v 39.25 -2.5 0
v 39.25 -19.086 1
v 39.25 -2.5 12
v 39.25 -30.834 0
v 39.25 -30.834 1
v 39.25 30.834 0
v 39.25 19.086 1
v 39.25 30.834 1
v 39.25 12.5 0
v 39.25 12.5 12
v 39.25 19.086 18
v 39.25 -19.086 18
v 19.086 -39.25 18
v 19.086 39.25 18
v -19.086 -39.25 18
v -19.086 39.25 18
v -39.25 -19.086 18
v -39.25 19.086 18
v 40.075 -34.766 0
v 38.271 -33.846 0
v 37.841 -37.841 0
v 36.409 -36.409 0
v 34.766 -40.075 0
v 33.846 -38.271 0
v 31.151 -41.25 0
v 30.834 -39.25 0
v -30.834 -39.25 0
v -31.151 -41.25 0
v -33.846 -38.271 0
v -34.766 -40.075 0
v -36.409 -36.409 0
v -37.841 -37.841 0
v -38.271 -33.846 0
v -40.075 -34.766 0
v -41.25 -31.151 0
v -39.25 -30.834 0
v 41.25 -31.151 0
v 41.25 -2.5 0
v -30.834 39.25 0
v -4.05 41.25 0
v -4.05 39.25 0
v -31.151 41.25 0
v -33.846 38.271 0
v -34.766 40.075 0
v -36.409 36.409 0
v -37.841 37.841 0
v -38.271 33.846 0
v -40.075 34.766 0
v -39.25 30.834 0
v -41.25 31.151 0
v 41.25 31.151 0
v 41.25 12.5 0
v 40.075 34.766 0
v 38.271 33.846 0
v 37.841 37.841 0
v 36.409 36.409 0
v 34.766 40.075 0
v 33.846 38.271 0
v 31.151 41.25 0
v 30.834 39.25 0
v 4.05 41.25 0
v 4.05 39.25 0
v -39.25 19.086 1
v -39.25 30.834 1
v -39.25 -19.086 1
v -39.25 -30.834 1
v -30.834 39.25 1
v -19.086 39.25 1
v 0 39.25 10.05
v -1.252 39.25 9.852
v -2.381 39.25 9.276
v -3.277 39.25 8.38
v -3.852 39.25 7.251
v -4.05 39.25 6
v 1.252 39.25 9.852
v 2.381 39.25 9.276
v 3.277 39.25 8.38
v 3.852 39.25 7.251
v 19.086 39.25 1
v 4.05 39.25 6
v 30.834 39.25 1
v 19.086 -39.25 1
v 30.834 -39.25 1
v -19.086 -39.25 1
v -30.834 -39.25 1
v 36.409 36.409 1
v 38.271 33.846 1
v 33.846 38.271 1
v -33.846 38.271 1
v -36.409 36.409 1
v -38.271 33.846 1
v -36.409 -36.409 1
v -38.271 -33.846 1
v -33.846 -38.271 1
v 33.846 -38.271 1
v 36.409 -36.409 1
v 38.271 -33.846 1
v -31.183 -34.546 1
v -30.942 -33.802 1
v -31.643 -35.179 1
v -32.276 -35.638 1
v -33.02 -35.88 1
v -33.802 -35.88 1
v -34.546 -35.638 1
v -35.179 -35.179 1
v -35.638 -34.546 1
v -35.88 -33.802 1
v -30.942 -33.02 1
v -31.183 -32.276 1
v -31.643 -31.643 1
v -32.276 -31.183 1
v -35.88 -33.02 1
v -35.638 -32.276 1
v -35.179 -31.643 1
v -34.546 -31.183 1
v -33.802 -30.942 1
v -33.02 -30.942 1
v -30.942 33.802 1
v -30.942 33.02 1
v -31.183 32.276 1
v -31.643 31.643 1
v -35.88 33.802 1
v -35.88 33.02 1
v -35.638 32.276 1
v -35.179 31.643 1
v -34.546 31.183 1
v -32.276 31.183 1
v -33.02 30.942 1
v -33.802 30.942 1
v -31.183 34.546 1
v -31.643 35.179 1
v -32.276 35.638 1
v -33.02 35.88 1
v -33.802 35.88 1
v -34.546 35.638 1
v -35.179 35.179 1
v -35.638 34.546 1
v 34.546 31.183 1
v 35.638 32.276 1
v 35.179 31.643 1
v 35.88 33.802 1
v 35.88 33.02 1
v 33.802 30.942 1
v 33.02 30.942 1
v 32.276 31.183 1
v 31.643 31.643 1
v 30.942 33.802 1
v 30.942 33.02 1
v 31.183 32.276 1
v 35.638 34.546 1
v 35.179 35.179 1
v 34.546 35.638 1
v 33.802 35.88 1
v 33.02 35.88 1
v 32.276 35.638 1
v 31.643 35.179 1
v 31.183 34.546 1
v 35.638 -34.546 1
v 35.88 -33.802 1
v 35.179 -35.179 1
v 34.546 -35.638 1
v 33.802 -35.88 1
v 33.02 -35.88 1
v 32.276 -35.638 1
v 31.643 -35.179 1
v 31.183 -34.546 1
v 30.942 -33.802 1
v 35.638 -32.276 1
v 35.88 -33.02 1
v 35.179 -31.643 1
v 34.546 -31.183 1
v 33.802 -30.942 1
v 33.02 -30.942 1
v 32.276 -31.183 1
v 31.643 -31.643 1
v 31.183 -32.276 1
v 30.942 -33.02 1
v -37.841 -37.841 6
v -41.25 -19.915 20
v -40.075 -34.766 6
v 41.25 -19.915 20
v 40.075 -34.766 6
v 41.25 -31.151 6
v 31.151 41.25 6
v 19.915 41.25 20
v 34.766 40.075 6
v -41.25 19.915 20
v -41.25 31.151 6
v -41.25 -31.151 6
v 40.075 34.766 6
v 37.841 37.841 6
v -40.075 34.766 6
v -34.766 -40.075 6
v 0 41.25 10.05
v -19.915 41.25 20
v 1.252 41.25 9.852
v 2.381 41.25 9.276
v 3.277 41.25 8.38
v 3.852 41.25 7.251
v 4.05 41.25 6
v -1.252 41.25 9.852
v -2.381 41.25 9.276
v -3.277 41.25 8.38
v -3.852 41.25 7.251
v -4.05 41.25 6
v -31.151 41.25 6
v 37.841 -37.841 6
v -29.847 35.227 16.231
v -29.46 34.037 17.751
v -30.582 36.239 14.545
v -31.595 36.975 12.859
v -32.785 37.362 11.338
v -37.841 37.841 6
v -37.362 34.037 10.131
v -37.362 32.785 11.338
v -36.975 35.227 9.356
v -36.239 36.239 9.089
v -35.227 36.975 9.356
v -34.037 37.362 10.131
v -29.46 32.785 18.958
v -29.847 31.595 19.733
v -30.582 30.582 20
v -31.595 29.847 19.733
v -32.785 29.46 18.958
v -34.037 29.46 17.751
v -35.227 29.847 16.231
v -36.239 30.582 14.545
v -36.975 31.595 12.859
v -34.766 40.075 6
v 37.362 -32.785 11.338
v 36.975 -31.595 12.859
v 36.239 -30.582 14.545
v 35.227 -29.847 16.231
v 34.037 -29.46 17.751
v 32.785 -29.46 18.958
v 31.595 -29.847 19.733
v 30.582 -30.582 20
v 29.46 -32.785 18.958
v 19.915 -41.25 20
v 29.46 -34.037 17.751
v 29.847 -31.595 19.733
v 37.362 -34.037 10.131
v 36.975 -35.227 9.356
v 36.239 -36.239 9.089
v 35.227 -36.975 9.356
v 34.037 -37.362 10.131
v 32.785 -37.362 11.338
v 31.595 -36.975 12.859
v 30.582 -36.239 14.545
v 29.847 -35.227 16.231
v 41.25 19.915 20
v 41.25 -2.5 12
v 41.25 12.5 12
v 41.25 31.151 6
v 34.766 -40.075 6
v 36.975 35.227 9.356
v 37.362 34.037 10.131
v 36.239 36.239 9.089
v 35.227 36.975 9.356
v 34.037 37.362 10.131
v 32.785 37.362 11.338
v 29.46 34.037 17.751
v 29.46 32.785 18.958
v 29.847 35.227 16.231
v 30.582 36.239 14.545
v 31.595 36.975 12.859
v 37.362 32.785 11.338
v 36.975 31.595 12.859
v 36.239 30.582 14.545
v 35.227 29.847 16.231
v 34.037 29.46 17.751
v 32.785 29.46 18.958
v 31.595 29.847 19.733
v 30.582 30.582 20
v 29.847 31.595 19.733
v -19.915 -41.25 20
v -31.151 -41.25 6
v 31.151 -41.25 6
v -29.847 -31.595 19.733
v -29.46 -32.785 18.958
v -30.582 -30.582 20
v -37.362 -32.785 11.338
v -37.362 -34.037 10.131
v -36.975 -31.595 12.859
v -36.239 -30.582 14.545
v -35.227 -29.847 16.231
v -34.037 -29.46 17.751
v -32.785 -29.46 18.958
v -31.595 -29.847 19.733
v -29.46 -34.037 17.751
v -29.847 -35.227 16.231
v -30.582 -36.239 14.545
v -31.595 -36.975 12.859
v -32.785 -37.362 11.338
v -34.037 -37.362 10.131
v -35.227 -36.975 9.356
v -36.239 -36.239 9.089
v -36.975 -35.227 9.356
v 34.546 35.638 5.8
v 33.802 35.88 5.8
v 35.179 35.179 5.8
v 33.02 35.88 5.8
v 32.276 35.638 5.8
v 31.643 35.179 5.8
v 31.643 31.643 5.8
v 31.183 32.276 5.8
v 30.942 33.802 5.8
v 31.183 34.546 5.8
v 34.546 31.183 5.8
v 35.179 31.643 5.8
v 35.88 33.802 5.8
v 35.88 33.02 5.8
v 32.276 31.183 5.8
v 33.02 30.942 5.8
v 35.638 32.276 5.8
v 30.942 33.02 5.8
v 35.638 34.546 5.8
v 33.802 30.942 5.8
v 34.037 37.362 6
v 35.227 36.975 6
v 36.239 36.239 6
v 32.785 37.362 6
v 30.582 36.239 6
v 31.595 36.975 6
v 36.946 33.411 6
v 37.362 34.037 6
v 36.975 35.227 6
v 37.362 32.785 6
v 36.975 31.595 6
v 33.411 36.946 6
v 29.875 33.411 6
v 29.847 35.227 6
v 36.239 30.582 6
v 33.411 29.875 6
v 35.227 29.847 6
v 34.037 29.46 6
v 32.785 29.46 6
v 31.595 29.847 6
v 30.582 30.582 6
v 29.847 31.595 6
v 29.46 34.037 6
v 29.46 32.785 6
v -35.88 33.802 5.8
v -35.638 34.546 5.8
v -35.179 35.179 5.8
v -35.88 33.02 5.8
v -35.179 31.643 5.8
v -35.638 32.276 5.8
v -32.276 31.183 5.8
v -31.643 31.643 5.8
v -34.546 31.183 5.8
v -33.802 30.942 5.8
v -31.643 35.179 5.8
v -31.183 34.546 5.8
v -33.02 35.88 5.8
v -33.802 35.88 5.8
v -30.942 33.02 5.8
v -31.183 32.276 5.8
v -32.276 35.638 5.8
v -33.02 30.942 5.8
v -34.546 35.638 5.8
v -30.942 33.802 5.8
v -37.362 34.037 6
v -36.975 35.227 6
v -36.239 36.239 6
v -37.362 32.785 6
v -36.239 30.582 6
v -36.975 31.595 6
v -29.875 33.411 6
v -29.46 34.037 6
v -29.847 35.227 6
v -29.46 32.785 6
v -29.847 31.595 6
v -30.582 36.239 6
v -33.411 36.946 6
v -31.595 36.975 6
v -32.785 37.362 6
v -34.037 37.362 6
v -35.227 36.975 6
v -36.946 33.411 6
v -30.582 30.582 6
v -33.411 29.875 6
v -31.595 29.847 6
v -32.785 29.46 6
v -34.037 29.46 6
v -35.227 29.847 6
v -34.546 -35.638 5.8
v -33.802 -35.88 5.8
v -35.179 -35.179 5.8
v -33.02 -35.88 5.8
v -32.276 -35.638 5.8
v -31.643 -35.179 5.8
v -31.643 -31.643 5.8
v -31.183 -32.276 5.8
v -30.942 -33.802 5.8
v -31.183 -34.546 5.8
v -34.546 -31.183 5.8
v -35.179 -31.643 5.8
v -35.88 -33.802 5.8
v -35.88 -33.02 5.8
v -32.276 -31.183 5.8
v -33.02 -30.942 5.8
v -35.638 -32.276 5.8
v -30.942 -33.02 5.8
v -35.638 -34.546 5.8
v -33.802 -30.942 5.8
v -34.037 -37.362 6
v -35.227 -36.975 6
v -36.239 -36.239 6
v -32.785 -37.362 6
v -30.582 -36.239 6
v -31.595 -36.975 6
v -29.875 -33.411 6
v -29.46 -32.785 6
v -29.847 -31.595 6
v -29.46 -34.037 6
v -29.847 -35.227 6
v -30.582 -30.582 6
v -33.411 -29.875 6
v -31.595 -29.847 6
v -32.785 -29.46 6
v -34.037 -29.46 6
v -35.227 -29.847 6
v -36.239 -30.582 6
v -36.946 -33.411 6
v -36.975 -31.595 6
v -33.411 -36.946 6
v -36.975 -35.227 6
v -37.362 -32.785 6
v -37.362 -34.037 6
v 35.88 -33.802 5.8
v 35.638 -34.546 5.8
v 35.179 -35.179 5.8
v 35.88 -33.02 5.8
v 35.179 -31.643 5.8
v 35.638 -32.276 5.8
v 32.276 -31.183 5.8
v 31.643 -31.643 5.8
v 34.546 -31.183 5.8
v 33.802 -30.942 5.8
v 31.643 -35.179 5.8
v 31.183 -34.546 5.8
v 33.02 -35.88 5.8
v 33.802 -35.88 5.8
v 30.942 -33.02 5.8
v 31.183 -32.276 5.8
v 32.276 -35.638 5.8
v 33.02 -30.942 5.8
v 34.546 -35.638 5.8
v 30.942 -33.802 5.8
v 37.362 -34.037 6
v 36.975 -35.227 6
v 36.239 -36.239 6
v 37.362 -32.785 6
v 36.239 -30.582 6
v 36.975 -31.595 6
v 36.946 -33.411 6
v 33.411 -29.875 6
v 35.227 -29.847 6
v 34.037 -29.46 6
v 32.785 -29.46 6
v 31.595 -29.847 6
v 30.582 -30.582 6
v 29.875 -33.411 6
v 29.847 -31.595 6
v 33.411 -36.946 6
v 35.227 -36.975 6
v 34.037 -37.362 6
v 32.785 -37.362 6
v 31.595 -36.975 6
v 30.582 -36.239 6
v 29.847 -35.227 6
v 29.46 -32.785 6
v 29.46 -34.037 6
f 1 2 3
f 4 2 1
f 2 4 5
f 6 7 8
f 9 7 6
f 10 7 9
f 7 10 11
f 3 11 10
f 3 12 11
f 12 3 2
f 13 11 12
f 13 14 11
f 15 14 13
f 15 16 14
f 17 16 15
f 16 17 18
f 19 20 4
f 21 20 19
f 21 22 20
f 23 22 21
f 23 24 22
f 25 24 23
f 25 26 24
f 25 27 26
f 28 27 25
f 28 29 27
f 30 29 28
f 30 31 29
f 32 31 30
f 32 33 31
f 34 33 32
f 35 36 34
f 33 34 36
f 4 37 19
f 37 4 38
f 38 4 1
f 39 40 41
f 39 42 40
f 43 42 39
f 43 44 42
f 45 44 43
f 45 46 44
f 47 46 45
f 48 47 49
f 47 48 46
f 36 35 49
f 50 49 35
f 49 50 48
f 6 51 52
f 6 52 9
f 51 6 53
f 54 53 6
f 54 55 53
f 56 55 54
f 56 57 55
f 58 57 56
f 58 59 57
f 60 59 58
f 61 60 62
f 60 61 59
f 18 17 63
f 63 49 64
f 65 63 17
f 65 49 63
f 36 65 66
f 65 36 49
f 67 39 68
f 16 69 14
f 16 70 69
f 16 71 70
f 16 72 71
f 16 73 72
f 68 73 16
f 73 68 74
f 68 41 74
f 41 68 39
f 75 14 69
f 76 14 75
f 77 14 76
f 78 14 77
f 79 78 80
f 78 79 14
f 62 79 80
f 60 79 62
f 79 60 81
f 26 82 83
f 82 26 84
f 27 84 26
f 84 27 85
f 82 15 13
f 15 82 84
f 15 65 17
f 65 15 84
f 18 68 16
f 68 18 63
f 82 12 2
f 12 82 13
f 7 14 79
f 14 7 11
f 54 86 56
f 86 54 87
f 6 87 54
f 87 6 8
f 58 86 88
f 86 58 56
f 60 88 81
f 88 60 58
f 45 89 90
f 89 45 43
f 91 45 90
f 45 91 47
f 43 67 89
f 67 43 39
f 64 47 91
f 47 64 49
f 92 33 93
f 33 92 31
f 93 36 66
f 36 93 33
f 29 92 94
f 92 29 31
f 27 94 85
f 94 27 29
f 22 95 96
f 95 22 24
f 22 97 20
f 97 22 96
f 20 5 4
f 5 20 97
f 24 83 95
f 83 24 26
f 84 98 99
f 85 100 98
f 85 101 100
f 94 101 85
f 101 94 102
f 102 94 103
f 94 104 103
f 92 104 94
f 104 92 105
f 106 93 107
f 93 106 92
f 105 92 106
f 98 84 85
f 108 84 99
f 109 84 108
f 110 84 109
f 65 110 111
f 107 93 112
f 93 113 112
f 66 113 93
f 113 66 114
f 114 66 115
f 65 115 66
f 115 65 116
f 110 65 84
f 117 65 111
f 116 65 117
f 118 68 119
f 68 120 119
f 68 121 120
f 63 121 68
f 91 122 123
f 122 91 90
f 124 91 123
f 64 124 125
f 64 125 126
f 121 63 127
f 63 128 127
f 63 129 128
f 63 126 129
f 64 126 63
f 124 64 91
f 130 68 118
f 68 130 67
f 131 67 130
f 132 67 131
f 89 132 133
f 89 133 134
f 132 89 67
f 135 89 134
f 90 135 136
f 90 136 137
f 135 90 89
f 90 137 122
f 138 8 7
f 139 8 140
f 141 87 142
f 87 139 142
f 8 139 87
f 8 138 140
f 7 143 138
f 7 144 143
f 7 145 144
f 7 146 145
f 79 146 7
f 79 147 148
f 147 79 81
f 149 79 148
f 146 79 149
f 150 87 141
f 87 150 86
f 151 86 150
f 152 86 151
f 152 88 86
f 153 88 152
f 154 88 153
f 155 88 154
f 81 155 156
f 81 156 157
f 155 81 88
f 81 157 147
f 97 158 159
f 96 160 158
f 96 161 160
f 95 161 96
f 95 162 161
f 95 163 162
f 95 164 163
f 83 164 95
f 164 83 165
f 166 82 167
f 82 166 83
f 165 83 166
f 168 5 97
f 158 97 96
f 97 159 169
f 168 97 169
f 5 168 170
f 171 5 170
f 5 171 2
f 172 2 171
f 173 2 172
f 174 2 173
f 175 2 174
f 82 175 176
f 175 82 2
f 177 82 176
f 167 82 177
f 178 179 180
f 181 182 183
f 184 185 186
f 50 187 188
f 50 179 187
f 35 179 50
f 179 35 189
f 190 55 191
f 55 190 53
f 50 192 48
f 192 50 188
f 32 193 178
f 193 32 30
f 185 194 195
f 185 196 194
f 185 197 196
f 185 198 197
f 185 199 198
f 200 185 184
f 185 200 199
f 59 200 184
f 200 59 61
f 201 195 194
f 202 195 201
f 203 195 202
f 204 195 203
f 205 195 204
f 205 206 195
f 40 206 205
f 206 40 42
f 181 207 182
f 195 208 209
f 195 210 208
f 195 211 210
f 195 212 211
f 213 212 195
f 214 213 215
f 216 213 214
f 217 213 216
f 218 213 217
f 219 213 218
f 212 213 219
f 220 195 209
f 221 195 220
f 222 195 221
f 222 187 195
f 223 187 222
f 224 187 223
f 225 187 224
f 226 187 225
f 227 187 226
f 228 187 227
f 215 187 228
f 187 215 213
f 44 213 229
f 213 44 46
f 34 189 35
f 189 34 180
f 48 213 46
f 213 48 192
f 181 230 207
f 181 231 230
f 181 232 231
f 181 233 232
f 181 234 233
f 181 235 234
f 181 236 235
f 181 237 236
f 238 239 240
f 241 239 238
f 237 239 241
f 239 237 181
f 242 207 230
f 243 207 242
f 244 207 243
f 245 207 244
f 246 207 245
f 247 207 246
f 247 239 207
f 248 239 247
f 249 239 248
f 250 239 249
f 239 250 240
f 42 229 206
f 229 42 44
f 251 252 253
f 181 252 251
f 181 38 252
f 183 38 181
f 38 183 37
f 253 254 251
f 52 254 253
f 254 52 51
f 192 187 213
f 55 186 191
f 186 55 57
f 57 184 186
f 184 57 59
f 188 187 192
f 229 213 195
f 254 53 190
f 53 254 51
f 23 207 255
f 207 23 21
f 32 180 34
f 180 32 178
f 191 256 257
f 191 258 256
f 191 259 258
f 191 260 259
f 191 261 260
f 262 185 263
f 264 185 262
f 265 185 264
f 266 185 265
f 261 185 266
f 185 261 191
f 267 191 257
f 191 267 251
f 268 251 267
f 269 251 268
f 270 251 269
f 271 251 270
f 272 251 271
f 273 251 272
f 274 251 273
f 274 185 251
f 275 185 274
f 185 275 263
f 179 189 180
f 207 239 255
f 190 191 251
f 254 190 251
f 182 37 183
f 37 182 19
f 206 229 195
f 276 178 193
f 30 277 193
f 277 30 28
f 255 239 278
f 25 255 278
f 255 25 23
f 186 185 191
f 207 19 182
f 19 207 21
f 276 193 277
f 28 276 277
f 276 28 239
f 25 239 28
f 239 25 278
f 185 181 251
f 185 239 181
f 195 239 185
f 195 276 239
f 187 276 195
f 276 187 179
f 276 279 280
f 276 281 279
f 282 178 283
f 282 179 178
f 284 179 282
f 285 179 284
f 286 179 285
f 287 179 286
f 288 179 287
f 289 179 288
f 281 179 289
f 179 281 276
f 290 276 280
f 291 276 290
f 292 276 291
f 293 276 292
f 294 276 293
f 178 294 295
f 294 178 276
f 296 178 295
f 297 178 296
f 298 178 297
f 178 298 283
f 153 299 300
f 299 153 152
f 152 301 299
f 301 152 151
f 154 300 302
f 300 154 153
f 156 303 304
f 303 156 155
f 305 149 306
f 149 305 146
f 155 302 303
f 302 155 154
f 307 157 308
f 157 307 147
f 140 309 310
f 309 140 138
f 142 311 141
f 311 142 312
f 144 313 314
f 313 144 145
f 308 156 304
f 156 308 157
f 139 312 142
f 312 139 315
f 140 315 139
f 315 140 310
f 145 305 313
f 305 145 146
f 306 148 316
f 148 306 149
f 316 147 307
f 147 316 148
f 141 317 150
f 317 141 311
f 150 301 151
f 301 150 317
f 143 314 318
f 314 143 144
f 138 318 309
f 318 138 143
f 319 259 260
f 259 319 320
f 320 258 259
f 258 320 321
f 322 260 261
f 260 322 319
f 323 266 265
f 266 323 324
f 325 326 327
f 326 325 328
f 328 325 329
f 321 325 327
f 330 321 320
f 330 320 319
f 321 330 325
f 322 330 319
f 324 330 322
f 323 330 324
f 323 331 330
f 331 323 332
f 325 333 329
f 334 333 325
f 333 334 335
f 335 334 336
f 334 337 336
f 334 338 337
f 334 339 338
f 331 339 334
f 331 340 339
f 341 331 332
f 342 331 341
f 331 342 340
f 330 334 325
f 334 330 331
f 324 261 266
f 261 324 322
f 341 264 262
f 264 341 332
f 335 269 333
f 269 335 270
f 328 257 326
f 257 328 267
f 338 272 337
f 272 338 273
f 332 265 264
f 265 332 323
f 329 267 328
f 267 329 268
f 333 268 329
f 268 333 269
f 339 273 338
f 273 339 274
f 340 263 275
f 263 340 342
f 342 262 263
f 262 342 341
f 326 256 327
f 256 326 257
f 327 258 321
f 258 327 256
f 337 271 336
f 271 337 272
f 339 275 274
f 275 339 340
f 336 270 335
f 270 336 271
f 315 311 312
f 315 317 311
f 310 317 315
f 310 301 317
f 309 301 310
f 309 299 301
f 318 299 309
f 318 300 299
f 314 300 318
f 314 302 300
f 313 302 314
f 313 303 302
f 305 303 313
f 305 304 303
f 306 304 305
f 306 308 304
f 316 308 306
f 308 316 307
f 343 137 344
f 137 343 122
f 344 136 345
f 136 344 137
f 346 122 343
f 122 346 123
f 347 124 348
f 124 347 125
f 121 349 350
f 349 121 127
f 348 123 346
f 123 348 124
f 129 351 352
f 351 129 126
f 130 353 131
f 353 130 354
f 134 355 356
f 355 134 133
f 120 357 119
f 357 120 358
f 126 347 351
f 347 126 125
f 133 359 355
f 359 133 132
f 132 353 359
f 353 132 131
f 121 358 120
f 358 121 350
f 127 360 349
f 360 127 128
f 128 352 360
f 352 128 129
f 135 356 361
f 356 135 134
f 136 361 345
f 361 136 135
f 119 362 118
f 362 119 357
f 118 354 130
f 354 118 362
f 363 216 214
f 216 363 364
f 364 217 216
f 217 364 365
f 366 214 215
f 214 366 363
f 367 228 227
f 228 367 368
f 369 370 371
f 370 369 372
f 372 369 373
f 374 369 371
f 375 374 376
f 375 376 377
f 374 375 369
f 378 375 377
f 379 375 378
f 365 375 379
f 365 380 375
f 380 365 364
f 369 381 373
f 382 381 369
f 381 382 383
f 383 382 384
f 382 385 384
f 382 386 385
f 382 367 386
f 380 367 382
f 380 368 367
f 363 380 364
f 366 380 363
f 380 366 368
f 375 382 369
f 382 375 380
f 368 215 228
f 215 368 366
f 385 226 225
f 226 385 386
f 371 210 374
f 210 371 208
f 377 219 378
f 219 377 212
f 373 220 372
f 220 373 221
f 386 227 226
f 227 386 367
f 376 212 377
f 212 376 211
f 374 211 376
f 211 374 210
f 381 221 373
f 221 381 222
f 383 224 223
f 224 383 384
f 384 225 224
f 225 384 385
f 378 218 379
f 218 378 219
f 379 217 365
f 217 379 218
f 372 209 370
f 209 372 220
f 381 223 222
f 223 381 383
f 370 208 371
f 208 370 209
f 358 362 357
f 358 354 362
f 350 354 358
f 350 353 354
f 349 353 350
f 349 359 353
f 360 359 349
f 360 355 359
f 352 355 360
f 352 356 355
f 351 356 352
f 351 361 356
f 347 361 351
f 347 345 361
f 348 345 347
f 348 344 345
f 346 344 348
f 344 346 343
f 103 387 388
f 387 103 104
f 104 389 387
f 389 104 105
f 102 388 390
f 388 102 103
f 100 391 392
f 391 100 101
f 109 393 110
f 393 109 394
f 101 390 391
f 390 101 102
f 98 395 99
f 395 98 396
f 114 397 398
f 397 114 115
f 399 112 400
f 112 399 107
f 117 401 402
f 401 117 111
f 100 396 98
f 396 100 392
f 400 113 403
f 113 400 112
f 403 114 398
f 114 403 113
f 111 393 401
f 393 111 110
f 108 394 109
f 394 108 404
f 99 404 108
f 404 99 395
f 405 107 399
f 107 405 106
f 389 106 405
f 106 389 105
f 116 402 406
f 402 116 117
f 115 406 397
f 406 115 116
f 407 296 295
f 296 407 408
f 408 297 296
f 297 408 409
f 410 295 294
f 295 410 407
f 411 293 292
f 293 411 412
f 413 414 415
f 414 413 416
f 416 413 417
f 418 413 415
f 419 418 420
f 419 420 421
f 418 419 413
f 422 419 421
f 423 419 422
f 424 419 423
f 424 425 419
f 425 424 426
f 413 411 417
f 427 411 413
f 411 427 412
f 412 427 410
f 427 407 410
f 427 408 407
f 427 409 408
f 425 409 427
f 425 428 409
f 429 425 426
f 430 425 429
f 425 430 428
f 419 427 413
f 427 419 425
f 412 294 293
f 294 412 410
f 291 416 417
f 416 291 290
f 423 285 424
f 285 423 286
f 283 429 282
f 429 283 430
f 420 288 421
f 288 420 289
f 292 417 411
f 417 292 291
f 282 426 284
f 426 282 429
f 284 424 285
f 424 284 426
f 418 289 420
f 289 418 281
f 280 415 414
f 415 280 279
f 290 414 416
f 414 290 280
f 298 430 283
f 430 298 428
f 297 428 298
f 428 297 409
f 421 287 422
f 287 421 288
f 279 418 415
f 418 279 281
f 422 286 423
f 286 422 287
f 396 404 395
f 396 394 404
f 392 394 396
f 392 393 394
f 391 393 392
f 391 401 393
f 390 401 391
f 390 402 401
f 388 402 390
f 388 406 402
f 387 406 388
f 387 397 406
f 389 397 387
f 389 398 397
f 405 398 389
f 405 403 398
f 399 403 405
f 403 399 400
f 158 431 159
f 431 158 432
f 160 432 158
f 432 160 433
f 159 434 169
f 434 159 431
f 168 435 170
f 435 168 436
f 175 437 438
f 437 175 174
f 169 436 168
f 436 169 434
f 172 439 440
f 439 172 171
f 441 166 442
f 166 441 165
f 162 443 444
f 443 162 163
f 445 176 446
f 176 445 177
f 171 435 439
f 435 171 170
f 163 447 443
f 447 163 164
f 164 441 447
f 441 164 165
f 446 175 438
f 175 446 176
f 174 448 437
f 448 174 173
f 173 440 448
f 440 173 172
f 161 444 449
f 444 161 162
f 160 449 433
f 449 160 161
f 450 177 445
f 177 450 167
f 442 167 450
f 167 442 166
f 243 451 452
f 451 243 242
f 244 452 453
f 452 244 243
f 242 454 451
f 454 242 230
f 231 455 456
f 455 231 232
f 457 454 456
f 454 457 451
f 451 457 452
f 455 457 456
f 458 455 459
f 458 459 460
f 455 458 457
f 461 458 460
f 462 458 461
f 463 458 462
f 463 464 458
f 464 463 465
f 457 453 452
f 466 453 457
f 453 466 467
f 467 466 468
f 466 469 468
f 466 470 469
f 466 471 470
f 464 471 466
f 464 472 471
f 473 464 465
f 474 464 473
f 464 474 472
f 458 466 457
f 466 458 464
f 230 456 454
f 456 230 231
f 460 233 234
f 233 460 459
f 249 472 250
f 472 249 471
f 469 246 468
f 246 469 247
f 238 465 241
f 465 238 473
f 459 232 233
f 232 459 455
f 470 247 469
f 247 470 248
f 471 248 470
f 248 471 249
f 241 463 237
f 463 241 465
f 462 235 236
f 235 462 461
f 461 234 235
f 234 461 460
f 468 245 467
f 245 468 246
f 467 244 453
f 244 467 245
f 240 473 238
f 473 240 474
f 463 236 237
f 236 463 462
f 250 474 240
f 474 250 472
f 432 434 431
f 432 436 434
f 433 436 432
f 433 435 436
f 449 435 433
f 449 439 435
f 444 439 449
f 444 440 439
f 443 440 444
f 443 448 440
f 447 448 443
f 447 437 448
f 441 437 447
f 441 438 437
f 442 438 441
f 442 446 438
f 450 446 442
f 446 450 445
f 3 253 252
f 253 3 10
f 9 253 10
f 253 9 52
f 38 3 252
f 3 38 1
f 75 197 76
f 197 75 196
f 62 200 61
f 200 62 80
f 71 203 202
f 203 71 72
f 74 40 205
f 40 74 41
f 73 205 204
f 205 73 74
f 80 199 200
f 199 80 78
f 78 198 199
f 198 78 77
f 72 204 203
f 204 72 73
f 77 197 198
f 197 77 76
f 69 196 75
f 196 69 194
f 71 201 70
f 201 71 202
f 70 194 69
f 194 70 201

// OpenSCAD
include <BOSL/constants.scad>
use <BOSL/shapes.scad>



$fn=20;

//box1a();
//box1b();

//box2a();
box2b();

//tesla_bottom();
//tesla_doublebottom();




module box1a() {
    w=82.5;
    h=30;

    dx_hole=59/2;
    hole_t=[dx_hole, 0, 0];
    
    module main_mass() {
        difference() {
            cuboid([w, w, h], chamfer=4, edges=EDGES_TOP, align=V_ABOVE);
            cuboid([w-4, w-4, h-2], fillet=4, edges=EDGES_TOP, align=V_ABOVE);
        }
    }
    
    module screw_guide() {
        translate(hole_t) union() {
            cylinder(d=6,h=h);
            hull() {
                translate([0, 0, h-12]) cylinder(d=6, h=12);
                translate([0, 0, h-8]) cylinder(d=8, h=8);
            }
            translate([2, -1, 8]) cube([7.8, 2, 20]);
        }
    }

    module screw_hole() {
        translate(hole_t) difference() {
            union() {
                cylinder(d=3.6,h=h);
                translate([0, 0, h-5]) cylinder(d=5.5, h=5);
            }
            translate([0, 0, h-5]) upcube([5.5, 5.5, .2]);
        }
    }

    rotate([180, 0, 0]) difference() {
        union() {
            main_mass();
            screw_guide();                
            mirror([1,0,0]) screw_guide();
        }
        screw_hole();
        mirror([1,0,0]) screw_hole();
    }
}

module box1b() {
    w=82.5;
    h=30;
    
    dx_hole=59/2;
    hole_t=[dx_hole, 0, 0];
    
    module main_mass() {
        module single_a(delta) {
            intersection() {
                upcube([w-2*delta, w-2*delta, h-delta]);
                rotate([0, 0, 45]) upcube([w+4-2*delta, w+4-2*delta, h-delta]);
            }
        }
        
        module single_b(delta, h) {
            cuboid(
                [w-2*delta, w-2*delta, h], 
                edges=EDGES_Z_ALL, 
                align=V_ABOVE
            );
        }
        
        difference() {
            hull() {
                single_a(0);
                single_b(0, 6);
            }
            single_a(2);
            single_b(2, 1);
        }
    }
    
        module screw_guide() {
        translate(hole_t) union() {
            cylinder(d=6,h=h);
            hull() {
                translate([0, 0, h-12]) cylinder(d=6, h=12);
                translate([0, 0, h-8]) cylinder(d=8, h=8);
            }
            translate([2, -1, 8]) cube([7.8, 2, 20]);
        }
    }

    module screw_hole() {
        translate(hole_t) difference() {
            union() {
                cylinder(d=3.6,h=h);
                translate([0, 0, h-5]) cylinder(d=5.5, h=5);
            }
            translate([0, 0, h-5]) upcube([5.5, 5.5, .2]);
        }
    }

    rotate([180, 0, 0]) difference() {
        union() {
            main_mass();
            screw_guide();                
            mirror([1,0,0]) screw_guide();
        }
        screw_hole();
        mirror([1,0,0]) screw_hole();
    }
}

module box2(h) {
    w=82.5;
    
    module main_mass() {
        module single_a(delta) {
            intersection() {
                upcube([w-2*delta, w-2*delta, h-delta]);
                rotate([0, 0, 45]) upcube([w+4-2*delta, w+4-2*delta, h-delta]);
            }
        }
        
        module single_b(delta, h) {
            cuboid(
                [w-2*delta, w-2*delta, h], 
                fillet=12-delta, 
                edges=EDGES_Z_ALL, 
                align=V_ABOVE
            );
        }
        
        difference() {
            hull() {
                single_a(0);
                single_b(0, 6);
            }
            single_a(2);
            single_b(2, 1);
        }
    }
    
    module screw_hole() {
        translate([94.5/2, 0, 0]) difference() {
            union() {
                cylinder(d=5, h=h);
                translate([0, 0, 6]) cylinder(d=8, h=h);
            }
            translate([0, 0, 5.8]) upcube([5, 5, .2]);
        }
    }
    
    difference() {
        main_mass();
        for (rz=[45 : 90 : 360]) {
            rotate([0, 0, rz]) screw_hole();
        }
    }
}

module box2a() {
    difference() {
        box2(30);
        translate([0, 30, 0]) upcube([31, 50, 25]);
        translate([30, 0, 0]) upcube([50, 15, 12]);
        translate([0, -30, 0]) cuboid([8, 50, 10], fillet=3);
    }
}

module box2b() {
    difference() {
        box2(20);
        translate([30, 5, 0]) upcube([50, 15, 12]);
        translate([0,30, 0]) cuboid([8, 50, 20], fillet=4);
    }
}

module tesla_bottom(h=15) {
    module single_mass(delta) {
        cuboid(
            [80-2*delta, 80-2*delta, h-delta],
            fillet=6-delta,
            edges=EDGES_Z_ALL, 
            align=V_ABOVE,
            $fn=50
        );
    }
    
    module screw_hole() {
        tx=59/2;
        w=(80-59)/2;
        
        translate([tx, 0 ,0]) difference() {
            union() {
                cylinder(d=6, h=h, $fn=20);
                translate([0, -1, 0]) cube([w, 2, h]);
                translate([4.75, -1, -1.5]) cube([1.5, 2, h+1.5]);
            }
            translate([0, 0, -2]) cylinder(d=2.1, h=h, $fn=20);
            hull () {
                cylinder(d=2.1, h=1, $fn=20);
                cylinder(d=4, h=0.1, $fn=20);
            }
        }
    }
    
    union() {
        difference() {
            single_mass(0);
            single_mass(2);
        }
        screw_hole();
        rotate([0, 0, 180]) screw_hole();
    }
}

module tesla_doublebottom() {
    h=15;
    difference() {
        union() {
            translate([40, 0 ,0]) tesla_bottom(h);
            translate([-40, 0 ,0]) tesla_bottom(h);
        }
        translate([-15, 30, 0]) cube([30, 20, 15]);
        translate([-15, 15, -2]) cube([30, 40, 15]);
        translate([-7.5, -2, 5]) cube([5.5, 40, 8]);
        translate([2, -2, 5]) cube([5.5, 40, 8]);
        
        color("red") slot([70,30,h-1], [70,20,h-1], d1=8, d2=4.5, h=2);
        color("red") slot([-70,-30,h-1], [-60,-30,h-1], d1=8, d2=4.5, h=2);
    }

    
}
